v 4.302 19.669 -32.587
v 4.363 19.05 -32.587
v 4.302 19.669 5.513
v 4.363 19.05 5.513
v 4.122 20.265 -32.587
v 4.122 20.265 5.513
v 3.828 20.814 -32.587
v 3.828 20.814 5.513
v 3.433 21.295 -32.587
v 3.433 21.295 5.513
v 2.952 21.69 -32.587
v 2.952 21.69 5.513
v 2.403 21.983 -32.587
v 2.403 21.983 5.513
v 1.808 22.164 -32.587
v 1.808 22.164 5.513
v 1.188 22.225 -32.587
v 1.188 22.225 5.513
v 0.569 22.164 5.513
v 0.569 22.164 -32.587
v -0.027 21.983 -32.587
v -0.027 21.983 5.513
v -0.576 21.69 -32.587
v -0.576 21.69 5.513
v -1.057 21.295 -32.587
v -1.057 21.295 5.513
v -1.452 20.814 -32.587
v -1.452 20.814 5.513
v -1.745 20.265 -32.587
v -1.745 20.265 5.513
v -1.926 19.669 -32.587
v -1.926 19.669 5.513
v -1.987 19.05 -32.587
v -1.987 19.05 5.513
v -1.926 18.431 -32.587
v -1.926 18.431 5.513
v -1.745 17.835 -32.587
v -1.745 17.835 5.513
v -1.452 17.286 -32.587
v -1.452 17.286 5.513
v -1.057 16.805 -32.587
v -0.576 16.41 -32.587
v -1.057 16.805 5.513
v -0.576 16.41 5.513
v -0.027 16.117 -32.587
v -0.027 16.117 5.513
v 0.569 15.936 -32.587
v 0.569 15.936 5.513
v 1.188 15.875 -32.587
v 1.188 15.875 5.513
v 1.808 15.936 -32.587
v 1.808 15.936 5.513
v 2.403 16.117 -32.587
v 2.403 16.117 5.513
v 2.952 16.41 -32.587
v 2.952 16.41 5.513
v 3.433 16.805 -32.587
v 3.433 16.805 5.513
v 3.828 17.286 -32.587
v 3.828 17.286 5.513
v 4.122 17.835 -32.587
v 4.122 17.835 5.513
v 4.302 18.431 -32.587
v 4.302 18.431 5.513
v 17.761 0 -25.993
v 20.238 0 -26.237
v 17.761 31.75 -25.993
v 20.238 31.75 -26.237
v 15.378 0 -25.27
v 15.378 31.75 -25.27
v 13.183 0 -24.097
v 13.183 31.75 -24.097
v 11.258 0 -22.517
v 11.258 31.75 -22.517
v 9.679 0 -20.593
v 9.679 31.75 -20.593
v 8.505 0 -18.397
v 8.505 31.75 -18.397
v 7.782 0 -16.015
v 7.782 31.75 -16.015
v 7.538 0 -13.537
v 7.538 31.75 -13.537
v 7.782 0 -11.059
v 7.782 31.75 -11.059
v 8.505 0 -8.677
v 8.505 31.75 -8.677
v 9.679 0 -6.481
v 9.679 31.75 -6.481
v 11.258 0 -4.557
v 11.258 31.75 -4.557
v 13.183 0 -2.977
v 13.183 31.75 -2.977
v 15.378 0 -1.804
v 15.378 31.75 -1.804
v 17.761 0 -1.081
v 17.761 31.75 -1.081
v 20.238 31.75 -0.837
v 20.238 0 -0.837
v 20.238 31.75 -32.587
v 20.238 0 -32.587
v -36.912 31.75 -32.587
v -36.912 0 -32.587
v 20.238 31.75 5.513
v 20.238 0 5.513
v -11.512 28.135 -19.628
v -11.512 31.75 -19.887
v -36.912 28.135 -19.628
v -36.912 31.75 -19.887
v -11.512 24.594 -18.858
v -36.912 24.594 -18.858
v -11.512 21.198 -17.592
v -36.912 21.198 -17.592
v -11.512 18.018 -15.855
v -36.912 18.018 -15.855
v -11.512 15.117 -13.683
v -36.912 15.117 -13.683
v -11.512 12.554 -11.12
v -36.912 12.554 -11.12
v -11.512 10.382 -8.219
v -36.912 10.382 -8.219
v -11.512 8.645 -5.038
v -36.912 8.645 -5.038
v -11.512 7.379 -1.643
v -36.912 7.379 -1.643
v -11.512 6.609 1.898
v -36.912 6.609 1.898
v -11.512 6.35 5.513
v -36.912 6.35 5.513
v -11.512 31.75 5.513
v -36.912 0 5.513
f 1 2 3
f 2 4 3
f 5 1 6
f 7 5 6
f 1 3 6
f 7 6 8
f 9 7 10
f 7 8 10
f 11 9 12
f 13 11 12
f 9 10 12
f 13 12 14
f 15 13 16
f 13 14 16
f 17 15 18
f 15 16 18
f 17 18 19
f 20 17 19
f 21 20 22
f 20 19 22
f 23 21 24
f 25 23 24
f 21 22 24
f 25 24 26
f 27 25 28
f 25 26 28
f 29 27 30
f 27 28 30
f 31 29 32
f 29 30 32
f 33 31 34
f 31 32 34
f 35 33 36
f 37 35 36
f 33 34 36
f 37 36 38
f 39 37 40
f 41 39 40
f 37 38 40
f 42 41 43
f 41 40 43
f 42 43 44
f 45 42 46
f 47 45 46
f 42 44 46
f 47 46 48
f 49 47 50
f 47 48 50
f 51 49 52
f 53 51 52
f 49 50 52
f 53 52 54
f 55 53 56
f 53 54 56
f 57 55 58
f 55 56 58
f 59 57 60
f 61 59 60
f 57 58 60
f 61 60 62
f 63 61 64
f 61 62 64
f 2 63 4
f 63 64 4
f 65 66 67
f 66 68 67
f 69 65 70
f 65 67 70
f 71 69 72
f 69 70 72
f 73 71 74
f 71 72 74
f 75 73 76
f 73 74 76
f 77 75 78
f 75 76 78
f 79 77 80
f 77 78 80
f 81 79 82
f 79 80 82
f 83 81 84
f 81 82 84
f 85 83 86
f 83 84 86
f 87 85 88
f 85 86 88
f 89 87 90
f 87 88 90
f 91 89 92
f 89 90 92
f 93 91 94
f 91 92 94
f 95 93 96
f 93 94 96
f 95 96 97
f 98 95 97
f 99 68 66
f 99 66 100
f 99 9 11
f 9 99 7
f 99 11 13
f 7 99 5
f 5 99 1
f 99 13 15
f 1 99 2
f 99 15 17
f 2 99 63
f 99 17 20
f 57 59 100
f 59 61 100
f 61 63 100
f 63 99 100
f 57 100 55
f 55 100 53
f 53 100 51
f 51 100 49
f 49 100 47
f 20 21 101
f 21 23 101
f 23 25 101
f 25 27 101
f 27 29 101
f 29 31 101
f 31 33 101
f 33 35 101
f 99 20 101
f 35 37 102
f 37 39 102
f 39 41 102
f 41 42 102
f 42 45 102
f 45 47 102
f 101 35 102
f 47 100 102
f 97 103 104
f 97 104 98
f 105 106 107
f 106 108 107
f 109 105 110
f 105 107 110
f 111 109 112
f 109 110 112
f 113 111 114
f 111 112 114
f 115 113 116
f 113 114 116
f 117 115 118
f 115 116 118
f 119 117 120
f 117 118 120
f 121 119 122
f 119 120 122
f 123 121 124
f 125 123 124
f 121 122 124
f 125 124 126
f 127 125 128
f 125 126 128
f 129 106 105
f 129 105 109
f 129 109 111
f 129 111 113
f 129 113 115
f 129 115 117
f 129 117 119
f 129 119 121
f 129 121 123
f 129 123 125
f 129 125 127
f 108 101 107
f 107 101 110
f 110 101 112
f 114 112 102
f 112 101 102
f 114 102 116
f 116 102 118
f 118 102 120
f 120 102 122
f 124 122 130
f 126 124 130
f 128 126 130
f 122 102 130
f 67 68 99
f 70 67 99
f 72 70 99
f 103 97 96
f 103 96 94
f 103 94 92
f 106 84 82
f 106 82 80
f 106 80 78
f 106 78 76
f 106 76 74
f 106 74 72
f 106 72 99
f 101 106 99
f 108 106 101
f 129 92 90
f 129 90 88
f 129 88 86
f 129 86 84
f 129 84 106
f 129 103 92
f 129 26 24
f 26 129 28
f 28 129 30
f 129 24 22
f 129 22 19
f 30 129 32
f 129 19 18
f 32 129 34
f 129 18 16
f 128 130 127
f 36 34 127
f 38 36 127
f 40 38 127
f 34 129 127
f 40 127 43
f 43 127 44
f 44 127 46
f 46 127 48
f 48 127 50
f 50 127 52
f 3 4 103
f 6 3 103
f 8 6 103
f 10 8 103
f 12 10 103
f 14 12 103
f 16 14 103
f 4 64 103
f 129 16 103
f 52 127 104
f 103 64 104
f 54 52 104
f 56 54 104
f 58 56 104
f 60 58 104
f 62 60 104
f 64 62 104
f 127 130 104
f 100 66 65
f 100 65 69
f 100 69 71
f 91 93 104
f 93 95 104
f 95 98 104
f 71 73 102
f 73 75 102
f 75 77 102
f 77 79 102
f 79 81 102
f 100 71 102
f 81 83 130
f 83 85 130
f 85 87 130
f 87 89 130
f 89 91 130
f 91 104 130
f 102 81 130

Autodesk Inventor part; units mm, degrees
ref_plane "YZ Plane" through (0, 0, 0) normal (1, 0, 0) x (0, 1, 0)
ref_plane "XZ Plane" through (0, 0, 0) normal (0, 1, 0) x (-1, 0, 0)
ref_plane "XY Plane" through (0, 0, 0) normal (0, 0, 1) x (1, 0, 0)
sketch "Sketch1" plane through (0, 0, 0) normal (0, 1, 0) x (-1, 0, 0)
  line L0 (36.9116, 5.5131) -> (-20.2384, 5.5131)
  line L1 (-20.2384, 5.5131) -> (-20.2384, -32.5869)
  line L2 (-20.2384, -32.5869) -> (36.9116, -32.5869)
  line L3 (36.9116, -32.5869) -> (36.9116, 5.5131)
  point P0 (0, 0)
  dimension "d0" = 57.15
  dimension "d1" = 38.1
extrude "Extrusion1" add sketch "Sketch1" along normal blind 31.75
sketch "Sketch2" plane through (0, 31.75, 0) normal (0, 1, 0) x (1, 0, 0)
  line L0 (-36.9116, -5.5131) -> (20.2384, -5.5131) projected
  line L1 (20.2384, -5.5131) -> (1.1884, -5.5131)
  line L2 (1.1884, -5.5131) -> (1.1884, 13.5369)
  line L3 (1.1884, 13.5369) -> (20.2384, 13.5369)
  line L4 (20.2384, 13.5369) -> (20.2384, -5.5131)
  line L5 (20.2384, -5.5131) -> (20.2384, 32.5869) projected
  line L6 (20.2384, 32.5869) -> (1.1884, 32.5869)
  line L7 (1.1884, 32.5869) -> (1.1884, 13.5369)
  line L8 (1.1884, 13.5369) -> (20.2384, 13.5369)
  line L9 (20.2384, 13.5369) -> (20.2384, 32.5869)
  point P0 (0, 0)
  dimension "d4" = 19.05
  dimension "d5" = 19.05
  dimension "d6" = 19.05
  dimension "d7" = 19.05
sketch "Sketch3" plane through (0, 31.75, 0) normal (0, 1, 0) x (1, 0, 0)
  line L0 (20.2384, -5.5131) -> (20.2384, 32.5869) projected
  circle A0 centre (20.2384, 13.5369) radius 12.7
  point P0 (0, 0)
  dimension "d8" = 25.4
extrude "Extrusion2" cut sketch "Sketch3" against normal blind 31.75
sketch "Sketch5" plane through (-36.9116, 0, -32.5869) normal (-1, 0, 0) x (0, 0, 1)
  line L0 (0, 0) -> (38.1, 0) projected
  line L1 (38.1, 0) -> (31.75, 0)
  line L2 (31.75, 0) -> (31.75, 6.35)
  line L3 (31.75, 6.35) -> (38.1, 6.35)
  line L4 (38.1, 6.35) -> (38.1, 0)
  line L5 (38.1, 0) -> (38.1, 31.75) projected
  circle A0 centre (38.1, 31.75) radius 25.4
  point P0 (32.5869, 0)
  dimension "d13" = 6.35
  dimension "d14" = 6.35
  dimension "d15" = 50.8
extrude "Extrusion3" cut sketch "Sketch5" against normal blind 25.4 contours A0
sketch "Sketch6" plane through (-36.9116, 0, 5.5131) normal (0, 0, 1) x (1, 0, 0)
  line L0 (25.4, 31.75) -> (57.15, 31.75) projected
  circle A0 centre (38.1, 19.05) radius 3.175
  point P0 (36.9116, 0)
  dimension "d20" = 6.35
extrude "Extrusion4" cut sketch "Sketch6" against normal blind 50.8
